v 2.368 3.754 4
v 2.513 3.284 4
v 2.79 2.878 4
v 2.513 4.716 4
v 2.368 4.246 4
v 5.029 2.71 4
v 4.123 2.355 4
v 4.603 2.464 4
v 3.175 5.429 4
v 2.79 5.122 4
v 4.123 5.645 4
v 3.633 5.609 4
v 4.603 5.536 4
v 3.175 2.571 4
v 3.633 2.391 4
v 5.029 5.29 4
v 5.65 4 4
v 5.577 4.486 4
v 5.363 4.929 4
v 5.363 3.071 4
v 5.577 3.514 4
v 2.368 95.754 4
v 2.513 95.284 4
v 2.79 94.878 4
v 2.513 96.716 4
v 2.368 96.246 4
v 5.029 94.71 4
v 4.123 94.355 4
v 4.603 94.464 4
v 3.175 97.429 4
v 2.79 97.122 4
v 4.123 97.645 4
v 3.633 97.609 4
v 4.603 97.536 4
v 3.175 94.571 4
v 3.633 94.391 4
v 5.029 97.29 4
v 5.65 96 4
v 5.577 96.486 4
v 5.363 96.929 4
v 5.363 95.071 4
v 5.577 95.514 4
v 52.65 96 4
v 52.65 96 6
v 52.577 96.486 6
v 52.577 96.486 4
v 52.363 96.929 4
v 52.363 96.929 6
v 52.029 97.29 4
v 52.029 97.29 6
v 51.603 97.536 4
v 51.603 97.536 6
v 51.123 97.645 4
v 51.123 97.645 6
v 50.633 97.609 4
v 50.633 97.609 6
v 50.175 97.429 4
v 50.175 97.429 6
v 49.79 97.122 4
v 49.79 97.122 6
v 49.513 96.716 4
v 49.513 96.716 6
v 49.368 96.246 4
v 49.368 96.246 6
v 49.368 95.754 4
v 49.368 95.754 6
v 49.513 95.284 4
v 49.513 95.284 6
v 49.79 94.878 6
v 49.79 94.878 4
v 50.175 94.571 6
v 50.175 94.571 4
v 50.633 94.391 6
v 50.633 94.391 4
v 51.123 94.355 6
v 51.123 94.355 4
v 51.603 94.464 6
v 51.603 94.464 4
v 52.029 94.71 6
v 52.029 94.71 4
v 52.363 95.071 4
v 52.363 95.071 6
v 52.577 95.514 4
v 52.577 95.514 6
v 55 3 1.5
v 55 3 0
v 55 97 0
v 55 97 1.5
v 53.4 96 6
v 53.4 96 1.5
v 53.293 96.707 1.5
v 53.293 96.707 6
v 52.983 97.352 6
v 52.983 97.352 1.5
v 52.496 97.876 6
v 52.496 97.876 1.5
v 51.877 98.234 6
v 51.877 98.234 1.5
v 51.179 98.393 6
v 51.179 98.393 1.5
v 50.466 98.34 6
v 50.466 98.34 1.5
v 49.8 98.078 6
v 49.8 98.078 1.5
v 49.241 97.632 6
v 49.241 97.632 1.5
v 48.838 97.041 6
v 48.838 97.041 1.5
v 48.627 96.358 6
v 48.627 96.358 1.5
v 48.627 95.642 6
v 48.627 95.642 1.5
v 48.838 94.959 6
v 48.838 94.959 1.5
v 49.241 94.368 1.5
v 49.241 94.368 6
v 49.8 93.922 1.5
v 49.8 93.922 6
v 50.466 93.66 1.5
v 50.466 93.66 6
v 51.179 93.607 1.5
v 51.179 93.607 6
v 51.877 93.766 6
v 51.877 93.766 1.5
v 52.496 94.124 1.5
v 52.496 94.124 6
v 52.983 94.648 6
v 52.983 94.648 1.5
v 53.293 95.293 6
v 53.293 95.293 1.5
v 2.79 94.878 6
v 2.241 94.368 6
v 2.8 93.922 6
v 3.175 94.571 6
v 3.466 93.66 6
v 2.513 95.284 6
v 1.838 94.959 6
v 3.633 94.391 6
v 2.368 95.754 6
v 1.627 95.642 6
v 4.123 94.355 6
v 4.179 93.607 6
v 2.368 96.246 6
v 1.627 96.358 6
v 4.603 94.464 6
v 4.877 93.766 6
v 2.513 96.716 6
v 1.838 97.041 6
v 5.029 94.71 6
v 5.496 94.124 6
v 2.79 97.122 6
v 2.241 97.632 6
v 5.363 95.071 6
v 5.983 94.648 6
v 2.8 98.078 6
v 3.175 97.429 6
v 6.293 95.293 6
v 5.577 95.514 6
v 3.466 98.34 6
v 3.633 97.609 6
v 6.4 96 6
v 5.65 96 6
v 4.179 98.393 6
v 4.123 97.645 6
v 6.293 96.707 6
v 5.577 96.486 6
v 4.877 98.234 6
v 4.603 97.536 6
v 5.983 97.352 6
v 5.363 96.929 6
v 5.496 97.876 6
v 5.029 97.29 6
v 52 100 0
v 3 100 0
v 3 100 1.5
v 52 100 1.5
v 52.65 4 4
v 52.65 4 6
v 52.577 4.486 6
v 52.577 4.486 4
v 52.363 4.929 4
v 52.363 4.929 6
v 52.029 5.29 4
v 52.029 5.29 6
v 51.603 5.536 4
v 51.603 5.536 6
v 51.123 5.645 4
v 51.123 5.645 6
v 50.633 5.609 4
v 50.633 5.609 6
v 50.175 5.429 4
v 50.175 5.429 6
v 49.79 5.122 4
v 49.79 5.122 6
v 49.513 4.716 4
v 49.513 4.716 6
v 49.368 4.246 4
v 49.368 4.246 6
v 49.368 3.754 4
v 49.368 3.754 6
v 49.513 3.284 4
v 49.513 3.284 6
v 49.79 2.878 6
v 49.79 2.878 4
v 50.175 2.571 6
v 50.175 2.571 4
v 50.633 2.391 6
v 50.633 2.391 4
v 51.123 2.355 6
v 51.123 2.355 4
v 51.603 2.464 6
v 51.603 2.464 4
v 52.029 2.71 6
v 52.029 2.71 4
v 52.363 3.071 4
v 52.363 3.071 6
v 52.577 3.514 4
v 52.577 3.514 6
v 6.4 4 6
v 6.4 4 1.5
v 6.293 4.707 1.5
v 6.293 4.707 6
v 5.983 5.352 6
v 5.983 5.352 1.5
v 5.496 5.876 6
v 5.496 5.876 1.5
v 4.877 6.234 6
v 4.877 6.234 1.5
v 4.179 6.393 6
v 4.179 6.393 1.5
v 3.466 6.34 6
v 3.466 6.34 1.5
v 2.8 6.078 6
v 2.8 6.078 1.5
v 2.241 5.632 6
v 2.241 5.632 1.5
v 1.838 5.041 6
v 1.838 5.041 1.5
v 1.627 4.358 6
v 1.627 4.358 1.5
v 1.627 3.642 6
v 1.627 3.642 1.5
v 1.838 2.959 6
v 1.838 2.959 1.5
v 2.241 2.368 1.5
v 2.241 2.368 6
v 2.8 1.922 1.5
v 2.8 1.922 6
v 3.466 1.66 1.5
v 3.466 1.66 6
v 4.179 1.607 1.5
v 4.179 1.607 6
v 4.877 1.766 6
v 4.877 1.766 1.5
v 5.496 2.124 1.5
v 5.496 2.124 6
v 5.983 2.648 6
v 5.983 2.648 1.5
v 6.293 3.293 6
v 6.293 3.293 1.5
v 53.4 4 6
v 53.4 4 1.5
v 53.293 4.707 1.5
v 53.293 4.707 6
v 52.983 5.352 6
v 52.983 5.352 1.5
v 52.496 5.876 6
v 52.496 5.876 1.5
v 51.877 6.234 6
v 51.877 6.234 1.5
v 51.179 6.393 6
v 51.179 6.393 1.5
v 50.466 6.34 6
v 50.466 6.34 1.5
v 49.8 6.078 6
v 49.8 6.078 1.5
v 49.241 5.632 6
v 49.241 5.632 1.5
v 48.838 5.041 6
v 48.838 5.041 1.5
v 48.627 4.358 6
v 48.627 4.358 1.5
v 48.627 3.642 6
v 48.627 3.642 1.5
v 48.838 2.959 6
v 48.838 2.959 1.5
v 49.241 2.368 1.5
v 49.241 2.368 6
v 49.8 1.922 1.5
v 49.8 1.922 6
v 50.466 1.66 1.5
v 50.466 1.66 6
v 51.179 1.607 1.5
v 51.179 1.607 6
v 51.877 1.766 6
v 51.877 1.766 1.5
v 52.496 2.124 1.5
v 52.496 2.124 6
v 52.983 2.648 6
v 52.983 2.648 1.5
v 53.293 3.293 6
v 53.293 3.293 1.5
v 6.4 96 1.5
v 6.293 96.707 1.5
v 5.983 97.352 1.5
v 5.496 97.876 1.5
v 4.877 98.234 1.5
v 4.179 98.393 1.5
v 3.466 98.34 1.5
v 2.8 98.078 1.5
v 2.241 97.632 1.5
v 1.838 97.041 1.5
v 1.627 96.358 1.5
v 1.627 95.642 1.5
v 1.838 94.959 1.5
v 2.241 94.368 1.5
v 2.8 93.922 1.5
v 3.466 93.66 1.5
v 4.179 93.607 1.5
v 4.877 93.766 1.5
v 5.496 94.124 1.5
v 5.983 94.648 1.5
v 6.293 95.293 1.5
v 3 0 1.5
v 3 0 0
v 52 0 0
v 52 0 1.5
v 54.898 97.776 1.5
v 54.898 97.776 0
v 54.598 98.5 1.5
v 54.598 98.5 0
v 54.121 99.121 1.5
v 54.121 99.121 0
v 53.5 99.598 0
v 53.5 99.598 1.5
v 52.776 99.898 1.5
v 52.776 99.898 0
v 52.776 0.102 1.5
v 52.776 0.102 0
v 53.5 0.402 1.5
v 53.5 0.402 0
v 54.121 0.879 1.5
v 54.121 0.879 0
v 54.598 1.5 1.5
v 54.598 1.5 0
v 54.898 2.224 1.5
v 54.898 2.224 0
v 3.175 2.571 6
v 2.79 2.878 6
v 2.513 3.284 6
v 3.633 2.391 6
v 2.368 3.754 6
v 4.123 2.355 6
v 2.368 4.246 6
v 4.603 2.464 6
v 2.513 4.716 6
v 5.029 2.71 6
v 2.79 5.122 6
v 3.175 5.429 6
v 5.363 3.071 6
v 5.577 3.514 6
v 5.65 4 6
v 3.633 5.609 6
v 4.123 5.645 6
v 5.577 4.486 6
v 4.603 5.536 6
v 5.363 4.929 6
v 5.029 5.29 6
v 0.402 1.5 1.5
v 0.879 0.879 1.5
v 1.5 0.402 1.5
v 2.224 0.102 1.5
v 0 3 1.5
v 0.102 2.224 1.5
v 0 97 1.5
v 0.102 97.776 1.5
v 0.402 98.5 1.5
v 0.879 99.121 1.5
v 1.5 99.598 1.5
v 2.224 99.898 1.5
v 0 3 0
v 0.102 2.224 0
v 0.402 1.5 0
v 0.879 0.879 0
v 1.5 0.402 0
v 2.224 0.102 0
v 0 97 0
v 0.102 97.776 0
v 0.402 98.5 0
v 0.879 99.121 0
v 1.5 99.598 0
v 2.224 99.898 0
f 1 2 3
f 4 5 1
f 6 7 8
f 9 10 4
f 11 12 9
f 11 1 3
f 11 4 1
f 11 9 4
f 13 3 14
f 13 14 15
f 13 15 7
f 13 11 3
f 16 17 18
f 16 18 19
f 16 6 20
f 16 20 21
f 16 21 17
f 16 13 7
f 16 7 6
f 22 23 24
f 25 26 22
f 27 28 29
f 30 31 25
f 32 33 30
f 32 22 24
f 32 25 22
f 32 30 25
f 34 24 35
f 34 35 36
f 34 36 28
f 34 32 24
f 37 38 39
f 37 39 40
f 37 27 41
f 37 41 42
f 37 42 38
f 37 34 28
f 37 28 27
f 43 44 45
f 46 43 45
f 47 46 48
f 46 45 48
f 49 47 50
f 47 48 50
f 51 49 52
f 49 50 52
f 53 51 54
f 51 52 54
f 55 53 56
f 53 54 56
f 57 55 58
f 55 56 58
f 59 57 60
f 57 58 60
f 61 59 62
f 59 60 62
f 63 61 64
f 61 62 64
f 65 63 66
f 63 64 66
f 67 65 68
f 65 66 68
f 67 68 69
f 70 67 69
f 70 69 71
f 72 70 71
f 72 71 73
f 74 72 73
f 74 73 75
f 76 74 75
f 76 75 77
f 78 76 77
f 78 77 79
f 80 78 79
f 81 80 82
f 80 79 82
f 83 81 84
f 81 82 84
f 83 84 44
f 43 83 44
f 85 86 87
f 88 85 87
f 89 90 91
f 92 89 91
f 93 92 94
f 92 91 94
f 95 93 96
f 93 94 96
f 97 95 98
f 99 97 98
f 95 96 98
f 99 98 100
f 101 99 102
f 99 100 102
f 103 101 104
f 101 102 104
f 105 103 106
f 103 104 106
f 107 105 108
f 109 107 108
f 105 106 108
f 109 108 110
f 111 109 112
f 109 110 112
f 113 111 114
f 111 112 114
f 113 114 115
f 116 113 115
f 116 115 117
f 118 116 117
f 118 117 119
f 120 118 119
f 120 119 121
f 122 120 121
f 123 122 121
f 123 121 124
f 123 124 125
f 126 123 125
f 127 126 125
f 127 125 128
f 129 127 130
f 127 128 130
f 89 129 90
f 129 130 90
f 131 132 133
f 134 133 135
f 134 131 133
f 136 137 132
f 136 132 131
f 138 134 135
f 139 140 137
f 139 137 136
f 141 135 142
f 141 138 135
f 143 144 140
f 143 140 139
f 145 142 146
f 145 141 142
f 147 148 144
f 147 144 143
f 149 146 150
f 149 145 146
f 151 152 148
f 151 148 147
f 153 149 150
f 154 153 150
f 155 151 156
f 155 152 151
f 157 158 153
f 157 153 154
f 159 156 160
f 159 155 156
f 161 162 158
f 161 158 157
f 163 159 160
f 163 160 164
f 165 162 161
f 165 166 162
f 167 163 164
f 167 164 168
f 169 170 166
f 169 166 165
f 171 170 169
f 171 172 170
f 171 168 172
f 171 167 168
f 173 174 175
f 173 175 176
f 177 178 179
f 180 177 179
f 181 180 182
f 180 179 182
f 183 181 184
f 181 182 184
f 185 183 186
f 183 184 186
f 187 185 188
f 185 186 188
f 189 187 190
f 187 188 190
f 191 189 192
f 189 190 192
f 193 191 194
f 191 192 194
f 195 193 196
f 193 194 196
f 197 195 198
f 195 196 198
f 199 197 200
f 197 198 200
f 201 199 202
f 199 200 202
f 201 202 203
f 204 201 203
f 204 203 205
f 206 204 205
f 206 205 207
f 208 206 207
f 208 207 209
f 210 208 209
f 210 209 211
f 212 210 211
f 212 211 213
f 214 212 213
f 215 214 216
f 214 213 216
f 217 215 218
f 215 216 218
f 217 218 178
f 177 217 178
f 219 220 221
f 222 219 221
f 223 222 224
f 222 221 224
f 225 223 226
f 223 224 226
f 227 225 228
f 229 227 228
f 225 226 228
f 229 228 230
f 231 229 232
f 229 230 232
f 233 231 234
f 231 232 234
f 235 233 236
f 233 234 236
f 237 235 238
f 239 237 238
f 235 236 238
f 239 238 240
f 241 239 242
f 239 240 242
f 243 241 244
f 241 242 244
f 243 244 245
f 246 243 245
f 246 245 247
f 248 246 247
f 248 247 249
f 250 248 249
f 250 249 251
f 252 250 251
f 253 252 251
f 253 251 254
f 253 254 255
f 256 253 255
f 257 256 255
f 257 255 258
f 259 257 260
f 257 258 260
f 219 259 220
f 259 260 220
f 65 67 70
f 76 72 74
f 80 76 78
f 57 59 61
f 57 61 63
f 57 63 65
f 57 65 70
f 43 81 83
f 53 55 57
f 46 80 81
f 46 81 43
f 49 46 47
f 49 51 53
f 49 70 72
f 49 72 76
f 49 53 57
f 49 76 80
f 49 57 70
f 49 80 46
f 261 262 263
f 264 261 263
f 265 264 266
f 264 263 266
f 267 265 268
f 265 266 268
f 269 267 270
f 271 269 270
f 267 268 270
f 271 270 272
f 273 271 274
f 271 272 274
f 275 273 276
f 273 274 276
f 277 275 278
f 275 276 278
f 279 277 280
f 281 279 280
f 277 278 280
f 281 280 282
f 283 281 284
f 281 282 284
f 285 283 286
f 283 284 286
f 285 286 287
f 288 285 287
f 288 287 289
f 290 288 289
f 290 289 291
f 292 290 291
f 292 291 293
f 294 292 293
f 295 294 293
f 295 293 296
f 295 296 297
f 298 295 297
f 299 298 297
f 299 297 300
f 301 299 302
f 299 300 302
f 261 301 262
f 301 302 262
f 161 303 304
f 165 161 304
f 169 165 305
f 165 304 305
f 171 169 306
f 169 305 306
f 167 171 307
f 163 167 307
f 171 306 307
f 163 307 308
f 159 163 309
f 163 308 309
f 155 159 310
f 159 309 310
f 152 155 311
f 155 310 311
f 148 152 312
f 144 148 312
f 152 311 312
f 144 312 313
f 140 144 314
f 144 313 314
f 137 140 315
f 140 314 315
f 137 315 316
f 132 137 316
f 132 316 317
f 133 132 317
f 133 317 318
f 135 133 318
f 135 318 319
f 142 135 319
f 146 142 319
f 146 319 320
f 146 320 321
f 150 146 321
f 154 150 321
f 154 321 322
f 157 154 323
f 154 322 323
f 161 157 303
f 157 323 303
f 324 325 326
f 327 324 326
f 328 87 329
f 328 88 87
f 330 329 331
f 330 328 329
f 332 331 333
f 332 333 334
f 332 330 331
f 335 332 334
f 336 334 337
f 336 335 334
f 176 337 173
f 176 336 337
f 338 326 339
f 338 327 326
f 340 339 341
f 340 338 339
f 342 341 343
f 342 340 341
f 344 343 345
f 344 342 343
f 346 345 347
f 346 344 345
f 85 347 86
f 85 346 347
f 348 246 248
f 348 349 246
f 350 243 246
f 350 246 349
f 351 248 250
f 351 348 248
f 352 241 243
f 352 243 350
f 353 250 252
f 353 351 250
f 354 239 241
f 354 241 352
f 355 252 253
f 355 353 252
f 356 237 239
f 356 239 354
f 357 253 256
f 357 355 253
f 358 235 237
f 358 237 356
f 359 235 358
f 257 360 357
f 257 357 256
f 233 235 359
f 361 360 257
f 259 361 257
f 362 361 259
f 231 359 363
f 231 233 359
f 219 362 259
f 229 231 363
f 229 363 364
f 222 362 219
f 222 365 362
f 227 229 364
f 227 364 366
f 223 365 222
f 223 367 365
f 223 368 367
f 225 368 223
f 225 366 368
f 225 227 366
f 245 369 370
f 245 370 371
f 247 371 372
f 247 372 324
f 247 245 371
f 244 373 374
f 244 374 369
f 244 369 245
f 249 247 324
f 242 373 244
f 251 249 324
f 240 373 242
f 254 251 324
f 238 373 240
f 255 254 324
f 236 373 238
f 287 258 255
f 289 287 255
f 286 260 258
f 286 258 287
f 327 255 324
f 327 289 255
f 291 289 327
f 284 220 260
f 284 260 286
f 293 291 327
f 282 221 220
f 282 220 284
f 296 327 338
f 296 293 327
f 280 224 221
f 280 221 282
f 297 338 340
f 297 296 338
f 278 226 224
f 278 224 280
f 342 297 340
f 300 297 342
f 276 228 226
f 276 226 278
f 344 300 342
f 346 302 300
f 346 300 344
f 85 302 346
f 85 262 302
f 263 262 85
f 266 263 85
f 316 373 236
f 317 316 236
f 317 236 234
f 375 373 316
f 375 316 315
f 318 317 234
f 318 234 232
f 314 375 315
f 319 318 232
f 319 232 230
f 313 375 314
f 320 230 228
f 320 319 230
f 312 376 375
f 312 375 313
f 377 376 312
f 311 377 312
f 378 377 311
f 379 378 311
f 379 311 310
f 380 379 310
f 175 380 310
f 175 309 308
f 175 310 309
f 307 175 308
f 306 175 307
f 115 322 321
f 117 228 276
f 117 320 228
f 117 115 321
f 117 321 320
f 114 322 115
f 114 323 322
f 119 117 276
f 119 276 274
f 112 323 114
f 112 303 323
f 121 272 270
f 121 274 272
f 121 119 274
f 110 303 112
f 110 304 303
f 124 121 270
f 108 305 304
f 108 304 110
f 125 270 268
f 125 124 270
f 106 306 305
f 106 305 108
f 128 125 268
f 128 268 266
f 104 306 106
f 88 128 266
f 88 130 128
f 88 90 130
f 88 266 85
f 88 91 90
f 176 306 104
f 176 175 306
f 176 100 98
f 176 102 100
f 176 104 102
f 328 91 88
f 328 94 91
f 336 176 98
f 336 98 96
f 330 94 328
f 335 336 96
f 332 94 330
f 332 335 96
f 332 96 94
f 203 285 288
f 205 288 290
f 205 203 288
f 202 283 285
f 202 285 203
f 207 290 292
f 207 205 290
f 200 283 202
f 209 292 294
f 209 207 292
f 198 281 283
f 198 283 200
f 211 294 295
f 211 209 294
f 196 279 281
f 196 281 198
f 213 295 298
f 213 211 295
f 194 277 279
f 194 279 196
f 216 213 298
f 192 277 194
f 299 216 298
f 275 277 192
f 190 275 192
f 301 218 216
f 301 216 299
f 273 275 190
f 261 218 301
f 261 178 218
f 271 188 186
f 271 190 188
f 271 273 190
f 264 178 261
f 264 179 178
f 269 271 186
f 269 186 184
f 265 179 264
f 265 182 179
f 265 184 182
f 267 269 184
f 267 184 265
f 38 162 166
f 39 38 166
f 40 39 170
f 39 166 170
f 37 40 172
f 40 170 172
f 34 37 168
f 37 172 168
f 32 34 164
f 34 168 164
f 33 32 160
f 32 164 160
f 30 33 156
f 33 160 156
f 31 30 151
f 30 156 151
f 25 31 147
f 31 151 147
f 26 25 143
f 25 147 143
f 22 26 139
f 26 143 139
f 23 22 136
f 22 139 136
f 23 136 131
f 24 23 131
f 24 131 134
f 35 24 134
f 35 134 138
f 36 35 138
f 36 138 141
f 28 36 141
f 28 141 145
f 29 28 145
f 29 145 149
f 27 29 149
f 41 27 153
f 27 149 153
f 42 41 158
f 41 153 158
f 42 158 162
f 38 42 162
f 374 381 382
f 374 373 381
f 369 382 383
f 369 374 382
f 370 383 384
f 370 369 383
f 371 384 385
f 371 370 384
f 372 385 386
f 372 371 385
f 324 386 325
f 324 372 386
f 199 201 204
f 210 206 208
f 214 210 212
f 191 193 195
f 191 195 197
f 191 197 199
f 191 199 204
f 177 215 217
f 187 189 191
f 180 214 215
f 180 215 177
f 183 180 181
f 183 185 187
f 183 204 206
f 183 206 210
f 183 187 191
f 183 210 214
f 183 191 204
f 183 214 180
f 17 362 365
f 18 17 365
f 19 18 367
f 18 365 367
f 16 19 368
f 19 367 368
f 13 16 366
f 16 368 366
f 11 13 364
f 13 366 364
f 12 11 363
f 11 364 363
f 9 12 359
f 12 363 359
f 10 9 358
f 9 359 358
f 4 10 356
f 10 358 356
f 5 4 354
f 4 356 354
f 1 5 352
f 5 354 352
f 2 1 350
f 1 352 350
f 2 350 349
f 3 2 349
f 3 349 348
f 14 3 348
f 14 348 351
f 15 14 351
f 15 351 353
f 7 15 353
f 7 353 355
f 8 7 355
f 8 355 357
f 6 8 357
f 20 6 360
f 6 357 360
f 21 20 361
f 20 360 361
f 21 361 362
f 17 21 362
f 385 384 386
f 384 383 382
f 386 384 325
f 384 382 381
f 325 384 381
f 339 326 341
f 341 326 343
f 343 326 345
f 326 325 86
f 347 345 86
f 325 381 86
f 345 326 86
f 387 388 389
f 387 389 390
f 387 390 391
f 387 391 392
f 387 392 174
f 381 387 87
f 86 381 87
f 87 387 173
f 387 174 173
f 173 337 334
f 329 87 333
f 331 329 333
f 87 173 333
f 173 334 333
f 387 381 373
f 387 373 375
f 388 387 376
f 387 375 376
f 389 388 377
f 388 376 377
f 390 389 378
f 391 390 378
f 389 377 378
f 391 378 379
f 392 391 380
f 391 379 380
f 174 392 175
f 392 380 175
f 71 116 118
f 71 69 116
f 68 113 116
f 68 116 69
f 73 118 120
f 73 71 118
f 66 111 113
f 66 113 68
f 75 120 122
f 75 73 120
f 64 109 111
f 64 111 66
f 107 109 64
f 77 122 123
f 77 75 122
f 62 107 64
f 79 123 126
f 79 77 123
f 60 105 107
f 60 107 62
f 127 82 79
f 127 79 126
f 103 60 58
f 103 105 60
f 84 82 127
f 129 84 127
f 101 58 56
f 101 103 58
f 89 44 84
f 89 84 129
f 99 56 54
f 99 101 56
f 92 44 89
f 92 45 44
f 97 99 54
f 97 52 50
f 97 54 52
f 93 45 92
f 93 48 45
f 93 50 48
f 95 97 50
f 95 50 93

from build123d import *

# Parameters (mm, degrees)
F0_W     = 55
F0_H     = 100
F1_DEPTH = 1.5
F2_R     = 3
F3_R     = 2.4
F4_DEPTH = 4.5
F5_R     = 1.65
F6_DEPTH = 2


with BuildPart() as f1:
    # F0 (on Top) → F1 (new body)
    with BuildSketch(Plane.XY):
        with Locations((27.5, 50)):
            Rectangle(F0_W, F0_H)
    extrude(amount=F1_DEPTH)

    # F2
    f2_edges = [f1.edges().sort_by_distance(p)[0] for p in [
        (0, 100, 0.75),
        (55, 100, 0.75),
        (0, 0, 0.75),
        (55, 0, 0.75),
    ]]
    fillet(f2_edges, radius=F2_R)

    # F3 (on face) → F4 (join)
    with BuildSketch(Plane.XY.offset(1.5)):
        with Locations((4, 96)):
            Circle(F3_R)
        with Locations((4, 4)):
            Circle(F3_R)
        with Locations((51, 96)):
            Circle(F3_R)
        with Locations((51, 4)):
            Circle(F3_R)
    extrude(amount=F4_DEPTH)

    # F5 (on face) → F6 (cut)
    with BuildSketch(Plane.XY.offset(6)):
        with Locations((4, 96)):
            Circle(F5_R)
        with Locations((4, 4)):
            Circle(F5_R)
        with Locations((51, 96)):
            Circle(F5_R)
        with Locations((51, 4)):
            Circle(F5_R)
    extrude(amount=-F6_DEPTH, mode=Mode.SUBTRACT)


solid = f1.part
